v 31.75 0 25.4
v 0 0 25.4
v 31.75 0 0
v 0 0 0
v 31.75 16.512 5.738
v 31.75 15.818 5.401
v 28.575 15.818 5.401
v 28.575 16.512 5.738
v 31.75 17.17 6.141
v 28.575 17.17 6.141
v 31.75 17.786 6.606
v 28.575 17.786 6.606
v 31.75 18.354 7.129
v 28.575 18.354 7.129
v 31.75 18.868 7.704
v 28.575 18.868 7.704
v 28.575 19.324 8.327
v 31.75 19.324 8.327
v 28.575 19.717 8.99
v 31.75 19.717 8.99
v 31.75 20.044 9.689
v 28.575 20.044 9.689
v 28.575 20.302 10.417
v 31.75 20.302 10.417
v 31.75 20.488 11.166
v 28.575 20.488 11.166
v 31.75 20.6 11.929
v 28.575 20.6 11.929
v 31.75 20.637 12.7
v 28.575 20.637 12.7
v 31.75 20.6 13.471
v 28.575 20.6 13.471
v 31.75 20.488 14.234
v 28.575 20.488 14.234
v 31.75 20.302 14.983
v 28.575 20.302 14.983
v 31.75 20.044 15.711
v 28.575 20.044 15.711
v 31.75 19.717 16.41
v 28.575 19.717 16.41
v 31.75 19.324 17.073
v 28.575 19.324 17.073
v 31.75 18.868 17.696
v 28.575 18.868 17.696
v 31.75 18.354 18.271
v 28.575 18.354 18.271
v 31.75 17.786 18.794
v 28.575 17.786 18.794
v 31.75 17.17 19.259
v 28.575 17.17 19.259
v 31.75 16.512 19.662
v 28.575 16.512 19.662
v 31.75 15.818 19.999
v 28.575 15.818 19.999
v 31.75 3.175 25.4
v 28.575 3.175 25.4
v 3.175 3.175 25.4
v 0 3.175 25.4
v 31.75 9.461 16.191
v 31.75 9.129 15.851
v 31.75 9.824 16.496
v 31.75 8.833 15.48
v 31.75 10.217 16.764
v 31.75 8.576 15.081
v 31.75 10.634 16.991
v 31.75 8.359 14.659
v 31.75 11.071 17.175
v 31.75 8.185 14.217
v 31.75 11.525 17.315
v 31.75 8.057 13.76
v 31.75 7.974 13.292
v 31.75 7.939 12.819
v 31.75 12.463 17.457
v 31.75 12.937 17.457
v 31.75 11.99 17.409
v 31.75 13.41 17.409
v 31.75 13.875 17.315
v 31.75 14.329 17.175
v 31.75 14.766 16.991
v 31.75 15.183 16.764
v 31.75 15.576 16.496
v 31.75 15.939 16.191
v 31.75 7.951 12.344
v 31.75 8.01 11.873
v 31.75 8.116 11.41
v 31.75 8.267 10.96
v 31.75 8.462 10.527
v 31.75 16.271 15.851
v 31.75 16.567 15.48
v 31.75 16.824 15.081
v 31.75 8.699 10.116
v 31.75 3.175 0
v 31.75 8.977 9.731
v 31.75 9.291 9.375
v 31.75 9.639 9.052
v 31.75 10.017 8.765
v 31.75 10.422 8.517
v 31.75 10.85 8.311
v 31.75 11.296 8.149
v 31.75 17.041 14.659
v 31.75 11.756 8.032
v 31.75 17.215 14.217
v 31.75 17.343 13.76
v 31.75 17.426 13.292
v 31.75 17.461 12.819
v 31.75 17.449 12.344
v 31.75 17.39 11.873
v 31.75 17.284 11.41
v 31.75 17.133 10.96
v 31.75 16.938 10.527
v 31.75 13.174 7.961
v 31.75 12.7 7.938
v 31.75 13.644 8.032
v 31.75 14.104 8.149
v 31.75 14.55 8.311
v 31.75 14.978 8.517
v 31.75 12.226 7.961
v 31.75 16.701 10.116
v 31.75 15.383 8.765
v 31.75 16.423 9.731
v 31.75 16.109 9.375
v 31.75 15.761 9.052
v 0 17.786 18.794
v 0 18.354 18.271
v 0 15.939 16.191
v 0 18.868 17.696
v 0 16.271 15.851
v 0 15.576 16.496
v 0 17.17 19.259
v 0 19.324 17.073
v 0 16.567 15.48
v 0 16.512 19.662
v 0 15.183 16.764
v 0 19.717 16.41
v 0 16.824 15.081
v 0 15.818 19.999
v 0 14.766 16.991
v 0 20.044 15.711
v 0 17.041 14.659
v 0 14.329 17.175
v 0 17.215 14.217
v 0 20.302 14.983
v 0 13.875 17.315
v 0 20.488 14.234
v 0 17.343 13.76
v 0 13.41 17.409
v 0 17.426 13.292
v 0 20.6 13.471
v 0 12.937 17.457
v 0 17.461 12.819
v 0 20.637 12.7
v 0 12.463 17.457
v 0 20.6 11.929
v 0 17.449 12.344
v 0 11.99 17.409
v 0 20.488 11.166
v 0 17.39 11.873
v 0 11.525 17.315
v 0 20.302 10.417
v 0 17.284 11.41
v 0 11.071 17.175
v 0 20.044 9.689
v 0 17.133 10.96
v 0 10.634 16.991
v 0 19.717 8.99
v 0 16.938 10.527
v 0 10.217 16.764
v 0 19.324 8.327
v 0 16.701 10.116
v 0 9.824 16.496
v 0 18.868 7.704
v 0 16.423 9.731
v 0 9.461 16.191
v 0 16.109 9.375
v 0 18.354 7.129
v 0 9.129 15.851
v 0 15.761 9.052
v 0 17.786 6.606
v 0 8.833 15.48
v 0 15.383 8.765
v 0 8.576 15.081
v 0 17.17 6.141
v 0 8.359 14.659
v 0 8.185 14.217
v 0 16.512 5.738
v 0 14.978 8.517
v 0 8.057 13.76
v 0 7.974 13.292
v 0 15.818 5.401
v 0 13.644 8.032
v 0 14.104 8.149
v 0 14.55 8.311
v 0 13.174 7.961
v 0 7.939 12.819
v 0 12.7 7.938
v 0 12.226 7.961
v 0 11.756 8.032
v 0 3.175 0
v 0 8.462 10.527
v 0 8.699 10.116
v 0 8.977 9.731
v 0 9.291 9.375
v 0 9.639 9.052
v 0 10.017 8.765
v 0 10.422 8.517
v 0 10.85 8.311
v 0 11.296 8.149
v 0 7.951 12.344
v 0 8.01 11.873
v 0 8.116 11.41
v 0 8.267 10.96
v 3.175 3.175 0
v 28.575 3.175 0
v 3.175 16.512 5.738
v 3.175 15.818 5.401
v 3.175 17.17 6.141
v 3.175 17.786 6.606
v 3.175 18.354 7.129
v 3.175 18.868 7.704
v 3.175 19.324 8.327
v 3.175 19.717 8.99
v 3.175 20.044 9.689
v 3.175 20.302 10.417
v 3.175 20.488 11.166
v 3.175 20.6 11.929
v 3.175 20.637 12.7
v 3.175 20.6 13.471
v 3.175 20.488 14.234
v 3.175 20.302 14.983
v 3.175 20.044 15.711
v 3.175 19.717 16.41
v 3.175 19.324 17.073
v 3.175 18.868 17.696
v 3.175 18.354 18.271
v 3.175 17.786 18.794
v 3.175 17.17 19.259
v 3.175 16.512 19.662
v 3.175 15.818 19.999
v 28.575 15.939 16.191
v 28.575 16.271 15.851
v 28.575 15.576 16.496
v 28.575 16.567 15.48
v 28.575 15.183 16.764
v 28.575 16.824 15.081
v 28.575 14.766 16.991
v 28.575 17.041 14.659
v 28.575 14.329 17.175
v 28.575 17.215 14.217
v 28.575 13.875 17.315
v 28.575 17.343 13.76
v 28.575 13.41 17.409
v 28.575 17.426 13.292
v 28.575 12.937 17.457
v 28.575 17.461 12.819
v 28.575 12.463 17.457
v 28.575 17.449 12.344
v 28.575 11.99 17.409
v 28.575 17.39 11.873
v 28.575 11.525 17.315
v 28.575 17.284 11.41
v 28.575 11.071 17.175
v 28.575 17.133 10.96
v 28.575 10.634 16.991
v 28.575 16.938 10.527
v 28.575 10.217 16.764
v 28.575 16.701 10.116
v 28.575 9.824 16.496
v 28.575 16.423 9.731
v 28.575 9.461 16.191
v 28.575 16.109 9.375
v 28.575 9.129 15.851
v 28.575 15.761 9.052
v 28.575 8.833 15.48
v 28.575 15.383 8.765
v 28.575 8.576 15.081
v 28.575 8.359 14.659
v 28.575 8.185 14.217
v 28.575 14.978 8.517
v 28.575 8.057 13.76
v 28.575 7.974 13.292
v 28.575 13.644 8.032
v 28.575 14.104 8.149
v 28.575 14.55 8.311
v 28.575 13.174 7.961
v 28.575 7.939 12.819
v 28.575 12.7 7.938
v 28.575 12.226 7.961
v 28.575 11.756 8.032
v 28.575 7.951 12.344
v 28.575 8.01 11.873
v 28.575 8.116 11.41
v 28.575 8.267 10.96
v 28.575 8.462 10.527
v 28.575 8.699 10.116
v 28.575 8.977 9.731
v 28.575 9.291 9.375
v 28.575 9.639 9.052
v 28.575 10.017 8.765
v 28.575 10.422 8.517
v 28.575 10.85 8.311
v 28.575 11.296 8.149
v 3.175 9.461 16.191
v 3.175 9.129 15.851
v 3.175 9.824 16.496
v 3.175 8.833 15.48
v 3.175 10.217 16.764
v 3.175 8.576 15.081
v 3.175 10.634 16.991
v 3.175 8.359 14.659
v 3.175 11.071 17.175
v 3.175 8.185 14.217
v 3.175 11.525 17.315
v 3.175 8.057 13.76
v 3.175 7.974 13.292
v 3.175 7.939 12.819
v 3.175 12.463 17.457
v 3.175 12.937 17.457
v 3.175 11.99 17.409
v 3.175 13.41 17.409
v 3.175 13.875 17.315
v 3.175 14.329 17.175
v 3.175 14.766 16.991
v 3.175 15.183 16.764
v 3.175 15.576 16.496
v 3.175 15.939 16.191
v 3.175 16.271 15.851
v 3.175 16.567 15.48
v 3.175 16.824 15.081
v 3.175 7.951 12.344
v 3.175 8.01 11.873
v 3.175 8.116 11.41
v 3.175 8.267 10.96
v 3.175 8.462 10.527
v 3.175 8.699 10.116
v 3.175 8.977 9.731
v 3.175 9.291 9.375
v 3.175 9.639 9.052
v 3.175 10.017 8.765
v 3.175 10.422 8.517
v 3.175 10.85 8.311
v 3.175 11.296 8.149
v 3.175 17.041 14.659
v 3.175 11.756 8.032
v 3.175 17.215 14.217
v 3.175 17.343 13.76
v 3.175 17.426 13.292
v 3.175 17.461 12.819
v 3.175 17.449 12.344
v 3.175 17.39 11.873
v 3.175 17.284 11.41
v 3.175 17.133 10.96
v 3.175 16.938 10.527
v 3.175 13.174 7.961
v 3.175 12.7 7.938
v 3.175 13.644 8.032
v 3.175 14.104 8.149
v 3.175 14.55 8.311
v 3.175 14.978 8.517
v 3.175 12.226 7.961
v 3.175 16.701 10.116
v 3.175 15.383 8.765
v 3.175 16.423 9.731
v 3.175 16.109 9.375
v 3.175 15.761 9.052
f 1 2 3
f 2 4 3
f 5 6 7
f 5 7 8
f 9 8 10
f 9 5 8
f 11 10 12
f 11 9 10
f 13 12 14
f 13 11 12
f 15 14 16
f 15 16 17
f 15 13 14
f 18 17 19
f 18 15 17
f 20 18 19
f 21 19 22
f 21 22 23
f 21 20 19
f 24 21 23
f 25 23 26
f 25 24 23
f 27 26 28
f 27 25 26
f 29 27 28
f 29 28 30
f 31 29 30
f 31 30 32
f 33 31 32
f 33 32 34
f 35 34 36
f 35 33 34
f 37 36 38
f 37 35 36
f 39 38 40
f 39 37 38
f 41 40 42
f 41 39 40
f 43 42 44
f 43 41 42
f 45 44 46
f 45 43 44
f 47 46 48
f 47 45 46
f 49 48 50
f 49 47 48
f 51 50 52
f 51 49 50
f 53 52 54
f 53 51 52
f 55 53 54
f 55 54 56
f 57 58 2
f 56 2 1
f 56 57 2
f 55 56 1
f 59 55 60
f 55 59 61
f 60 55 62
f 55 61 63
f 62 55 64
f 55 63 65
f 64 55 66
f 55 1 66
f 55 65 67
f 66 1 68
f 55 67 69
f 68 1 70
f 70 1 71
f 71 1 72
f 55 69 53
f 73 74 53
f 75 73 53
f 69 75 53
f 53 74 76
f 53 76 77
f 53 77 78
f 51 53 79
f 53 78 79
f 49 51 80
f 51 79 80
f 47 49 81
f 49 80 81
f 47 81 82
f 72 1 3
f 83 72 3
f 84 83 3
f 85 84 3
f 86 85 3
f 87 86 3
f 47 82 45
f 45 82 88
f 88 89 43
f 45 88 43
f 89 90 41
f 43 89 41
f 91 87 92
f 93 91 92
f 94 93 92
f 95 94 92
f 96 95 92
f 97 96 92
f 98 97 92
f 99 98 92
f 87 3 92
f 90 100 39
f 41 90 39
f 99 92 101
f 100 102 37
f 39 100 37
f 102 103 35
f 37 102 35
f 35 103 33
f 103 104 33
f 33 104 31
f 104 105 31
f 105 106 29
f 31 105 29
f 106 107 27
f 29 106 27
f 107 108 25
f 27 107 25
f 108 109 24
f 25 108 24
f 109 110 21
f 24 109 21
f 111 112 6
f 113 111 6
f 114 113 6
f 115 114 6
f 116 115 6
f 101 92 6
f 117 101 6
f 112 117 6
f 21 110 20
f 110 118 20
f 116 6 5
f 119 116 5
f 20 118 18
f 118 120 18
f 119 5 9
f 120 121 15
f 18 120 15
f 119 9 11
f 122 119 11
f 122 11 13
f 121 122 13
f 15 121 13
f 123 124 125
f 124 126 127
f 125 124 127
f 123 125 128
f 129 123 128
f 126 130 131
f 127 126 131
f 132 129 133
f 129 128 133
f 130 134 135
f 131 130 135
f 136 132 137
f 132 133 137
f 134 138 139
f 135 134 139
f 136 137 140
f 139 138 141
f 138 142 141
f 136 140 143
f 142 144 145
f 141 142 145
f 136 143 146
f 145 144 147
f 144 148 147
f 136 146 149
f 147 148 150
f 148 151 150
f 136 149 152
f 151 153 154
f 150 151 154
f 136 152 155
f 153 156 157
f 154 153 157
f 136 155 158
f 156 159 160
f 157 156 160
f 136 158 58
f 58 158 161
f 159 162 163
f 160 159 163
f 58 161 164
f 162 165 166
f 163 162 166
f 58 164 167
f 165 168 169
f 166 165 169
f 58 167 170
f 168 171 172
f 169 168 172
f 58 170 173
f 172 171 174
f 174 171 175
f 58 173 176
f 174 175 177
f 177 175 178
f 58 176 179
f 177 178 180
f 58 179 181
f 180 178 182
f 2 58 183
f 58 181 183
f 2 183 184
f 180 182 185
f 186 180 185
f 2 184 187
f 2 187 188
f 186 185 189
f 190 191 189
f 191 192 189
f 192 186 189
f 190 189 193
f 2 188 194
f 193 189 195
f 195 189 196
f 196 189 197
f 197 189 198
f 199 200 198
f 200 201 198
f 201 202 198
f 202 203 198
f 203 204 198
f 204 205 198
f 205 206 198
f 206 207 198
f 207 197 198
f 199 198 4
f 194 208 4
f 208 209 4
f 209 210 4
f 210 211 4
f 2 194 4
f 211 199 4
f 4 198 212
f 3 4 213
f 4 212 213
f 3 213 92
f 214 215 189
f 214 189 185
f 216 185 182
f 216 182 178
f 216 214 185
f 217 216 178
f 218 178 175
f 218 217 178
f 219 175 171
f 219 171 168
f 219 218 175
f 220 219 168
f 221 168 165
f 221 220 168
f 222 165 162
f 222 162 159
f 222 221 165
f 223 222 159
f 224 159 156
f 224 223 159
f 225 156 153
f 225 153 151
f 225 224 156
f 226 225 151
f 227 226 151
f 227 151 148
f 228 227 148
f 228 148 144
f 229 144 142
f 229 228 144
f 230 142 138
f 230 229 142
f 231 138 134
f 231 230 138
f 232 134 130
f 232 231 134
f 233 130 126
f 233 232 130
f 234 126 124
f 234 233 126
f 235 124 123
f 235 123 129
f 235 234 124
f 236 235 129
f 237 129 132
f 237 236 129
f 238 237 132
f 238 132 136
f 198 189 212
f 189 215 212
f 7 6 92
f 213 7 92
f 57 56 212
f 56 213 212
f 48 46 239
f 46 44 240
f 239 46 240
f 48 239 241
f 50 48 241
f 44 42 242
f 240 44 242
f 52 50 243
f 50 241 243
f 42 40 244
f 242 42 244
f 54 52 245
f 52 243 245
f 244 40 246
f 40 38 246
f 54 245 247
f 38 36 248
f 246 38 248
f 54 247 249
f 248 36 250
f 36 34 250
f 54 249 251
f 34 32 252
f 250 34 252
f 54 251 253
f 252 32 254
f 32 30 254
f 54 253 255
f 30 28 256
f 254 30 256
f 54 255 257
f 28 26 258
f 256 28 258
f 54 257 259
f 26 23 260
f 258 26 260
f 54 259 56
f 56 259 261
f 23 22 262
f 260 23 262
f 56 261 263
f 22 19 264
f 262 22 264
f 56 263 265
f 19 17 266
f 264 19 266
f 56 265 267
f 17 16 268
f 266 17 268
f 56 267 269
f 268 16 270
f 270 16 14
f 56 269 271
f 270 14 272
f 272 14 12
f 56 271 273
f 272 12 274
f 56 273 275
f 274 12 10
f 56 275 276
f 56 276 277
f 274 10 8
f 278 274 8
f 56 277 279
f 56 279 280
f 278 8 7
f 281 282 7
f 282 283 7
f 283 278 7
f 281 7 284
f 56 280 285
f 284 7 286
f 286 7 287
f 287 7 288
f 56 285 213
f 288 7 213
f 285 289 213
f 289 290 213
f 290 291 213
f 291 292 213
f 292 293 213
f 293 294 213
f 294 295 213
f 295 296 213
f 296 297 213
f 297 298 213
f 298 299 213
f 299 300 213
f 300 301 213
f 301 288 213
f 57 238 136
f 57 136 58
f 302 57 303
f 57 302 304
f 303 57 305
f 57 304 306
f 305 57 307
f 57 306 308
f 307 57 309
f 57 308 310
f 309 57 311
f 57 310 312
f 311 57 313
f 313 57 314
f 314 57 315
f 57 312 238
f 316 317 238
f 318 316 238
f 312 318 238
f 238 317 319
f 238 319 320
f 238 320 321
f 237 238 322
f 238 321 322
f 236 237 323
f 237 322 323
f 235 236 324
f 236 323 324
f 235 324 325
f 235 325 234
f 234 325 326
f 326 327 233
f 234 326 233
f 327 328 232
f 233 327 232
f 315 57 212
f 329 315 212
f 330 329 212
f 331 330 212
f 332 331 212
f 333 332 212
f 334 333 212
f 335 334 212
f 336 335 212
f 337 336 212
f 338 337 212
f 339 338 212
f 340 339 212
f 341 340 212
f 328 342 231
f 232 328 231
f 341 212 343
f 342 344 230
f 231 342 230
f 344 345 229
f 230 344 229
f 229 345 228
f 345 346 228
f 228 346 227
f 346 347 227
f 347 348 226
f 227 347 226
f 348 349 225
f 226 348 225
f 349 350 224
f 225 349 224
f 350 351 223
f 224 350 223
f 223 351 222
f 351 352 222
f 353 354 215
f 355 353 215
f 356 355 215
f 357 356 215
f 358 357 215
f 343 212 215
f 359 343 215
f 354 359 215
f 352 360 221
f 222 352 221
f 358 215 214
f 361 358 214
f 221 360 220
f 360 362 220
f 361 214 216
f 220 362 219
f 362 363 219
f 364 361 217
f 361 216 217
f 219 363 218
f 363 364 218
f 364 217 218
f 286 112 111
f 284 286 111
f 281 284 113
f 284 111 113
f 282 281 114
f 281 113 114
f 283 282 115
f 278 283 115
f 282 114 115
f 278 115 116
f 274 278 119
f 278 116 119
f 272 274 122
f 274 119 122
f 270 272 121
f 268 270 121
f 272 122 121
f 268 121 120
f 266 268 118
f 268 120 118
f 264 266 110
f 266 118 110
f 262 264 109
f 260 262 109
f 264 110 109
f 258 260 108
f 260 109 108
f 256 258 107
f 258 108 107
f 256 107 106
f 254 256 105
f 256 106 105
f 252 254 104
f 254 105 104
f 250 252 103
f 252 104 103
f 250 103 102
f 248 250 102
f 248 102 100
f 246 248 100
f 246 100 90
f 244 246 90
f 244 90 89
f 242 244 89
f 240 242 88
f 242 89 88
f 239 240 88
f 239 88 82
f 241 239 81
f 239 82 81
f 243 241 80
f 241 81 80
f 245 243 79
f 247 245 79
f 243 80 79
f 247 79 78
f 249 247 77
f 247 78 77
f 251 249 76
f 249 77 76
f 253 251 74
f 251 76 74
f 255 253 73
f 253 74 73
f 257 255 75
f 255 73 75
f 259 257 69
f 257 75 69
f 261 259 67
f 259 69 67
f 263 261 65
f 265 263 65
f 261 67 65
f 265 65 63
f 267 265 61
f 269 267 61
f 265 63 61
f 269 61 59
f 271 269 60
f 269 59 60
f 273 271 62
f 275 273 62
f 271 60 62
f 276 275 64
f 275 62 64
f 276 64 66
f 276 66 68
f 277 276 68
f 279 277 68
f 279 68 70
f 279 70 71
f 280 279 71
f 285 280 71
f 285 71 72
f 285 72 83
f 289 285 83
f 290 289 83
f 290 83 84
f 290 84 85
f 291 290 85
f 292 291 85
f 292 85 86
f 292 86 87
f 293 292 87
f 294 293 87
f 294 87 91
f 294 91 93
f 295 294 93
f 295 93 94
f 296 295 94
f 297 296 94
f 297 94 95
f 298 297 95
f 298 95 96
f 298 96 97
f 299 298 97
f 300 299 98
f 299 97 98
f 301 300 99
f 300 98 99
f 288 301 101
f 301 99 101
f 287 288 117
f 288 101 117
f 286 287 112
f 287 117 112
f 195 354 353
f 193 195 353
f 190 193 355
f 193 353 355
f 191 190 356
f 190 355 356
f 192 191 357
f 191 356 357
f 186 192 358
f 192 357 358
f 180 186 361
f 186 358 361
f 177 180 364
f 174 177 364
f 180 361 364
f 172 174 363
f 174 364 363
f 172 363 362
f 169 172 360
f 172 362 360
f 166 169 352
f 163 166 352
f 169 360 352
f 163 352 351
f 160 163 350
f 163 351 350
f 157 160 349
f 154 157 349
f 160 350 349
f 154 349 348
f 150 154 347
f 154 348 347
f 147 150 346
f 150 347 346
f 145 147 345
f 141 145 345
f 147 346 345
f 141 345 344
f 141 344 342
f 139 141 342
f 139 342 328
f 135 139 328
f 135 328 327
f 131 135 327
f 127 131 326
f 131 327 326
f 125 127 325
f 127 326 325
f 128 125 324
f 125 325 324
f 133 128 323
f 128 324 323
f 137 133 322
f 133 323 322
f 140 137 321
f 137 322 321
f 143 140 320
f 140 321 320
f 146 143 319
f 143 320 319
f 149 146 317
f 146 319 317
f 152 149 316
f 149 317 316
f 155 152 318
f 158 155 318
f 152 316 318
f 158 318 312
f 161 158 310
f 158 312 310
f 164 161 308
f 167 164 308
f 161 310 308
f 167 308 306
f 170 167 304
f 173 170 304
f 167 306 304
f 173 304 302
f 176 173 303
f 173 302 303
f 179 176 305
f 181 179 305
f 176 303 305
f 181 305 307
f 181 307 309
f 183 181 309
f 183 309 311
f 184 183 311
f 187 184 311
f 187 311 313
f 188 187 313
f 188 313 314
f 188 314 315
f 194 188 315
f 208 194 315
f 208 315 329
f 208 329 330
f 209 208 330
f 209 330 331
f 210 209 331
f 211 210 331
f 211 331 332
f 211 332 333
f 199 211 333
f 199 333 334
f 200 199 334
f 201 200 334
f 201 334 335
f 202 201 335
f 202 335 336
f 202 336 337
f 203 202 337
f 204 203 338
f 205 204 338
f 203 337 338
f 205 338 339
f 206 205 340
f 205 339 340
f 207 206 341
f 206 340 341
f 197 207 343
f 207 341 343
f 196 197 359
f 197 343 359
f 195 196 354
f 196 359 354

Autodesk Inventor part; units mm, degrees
ref_plane "YZ Plane" through (0, 0, 0) normal (1, 0, 0) x (0, 1, 0)
ref_plane "XZ Plane" through (0, 0, 0) normal (0, 1, 0) x (-1, 0, 0)
ref_plane "XY Plane" through (0, 0, 0) normal (0, 0, 1) x (1, 0, 0)
sketch "Sketch1" plane through (0, 0, 0) normal (0, 0, 1) x (1, 0, 0)
  line L0 (0, 0) -> (31.75, 0)
  line L1 (31.75, 0) -> (31.75, 25.4)
  line L2 (0, 25.4) -> (0, 0)
  line L3 (28.575, 25.4) -> (28.575, 3.175)
  line L4 (28.575, 3.175) -> (3.175, 3.175)
  line L5 (3.175, 3.175) -> (3.175, 25.4)
  line L6 (31.75, 25.4) -> (28.575, 25.4)
  line L7 (3.175, 25.4) -> (0, 25.4)
  dimension "d0" = 25.4
  dimension "d1" = 31.75
  dimension "d2" = 3.175
  dimension "d3" = 3.175
  dimension "d4" = 3.175
extrude "Extrusion1" add sketch "Sketch1" along normal blind 25.4
sketch "Sketch2" plane through (31.75, 0, 0) normal (1, 0, 0) x (0, 0, -1)
  line L0 (-25.4, 25.4) -> (-25.4, 0) projected
  line L1 (0, 0) -> (-25.4, 0) projected
  line L2 (0, 0) -> (0, 25.4) projected
  line L3 (0, 25.4) -> (-25.4, 25.4) projected
  circle A0 centre (-12.7, 12.7) radius 4.7625
  arc A1 (-5.4006, 15.818) -> (-19.9994, 15.818) centre (-12.7, 12.7) ccw
  line L4 (-19.9994, 15.818) -> (-25.4, 3.175)
  line L5 (-5.4006, 15.818) -> (0, 3.175)
  point P0 (0, 12.7)
  dimension "d9" = 9.525
  dimension "d13" = 3.175
  dimension "d14" = 12.7
  dimension "d15" = 7.9375
  dimension "d16" = 12.7
extrude "Extrusion2" cut sketch "Sketch2" against normal through all contours L3 L2 L5 A1 L4 L0 | A0
equation "\"d3\" = d2"
equation "\"d4\" = d3"
properties part number "manipulator pnumaitic pivot"
